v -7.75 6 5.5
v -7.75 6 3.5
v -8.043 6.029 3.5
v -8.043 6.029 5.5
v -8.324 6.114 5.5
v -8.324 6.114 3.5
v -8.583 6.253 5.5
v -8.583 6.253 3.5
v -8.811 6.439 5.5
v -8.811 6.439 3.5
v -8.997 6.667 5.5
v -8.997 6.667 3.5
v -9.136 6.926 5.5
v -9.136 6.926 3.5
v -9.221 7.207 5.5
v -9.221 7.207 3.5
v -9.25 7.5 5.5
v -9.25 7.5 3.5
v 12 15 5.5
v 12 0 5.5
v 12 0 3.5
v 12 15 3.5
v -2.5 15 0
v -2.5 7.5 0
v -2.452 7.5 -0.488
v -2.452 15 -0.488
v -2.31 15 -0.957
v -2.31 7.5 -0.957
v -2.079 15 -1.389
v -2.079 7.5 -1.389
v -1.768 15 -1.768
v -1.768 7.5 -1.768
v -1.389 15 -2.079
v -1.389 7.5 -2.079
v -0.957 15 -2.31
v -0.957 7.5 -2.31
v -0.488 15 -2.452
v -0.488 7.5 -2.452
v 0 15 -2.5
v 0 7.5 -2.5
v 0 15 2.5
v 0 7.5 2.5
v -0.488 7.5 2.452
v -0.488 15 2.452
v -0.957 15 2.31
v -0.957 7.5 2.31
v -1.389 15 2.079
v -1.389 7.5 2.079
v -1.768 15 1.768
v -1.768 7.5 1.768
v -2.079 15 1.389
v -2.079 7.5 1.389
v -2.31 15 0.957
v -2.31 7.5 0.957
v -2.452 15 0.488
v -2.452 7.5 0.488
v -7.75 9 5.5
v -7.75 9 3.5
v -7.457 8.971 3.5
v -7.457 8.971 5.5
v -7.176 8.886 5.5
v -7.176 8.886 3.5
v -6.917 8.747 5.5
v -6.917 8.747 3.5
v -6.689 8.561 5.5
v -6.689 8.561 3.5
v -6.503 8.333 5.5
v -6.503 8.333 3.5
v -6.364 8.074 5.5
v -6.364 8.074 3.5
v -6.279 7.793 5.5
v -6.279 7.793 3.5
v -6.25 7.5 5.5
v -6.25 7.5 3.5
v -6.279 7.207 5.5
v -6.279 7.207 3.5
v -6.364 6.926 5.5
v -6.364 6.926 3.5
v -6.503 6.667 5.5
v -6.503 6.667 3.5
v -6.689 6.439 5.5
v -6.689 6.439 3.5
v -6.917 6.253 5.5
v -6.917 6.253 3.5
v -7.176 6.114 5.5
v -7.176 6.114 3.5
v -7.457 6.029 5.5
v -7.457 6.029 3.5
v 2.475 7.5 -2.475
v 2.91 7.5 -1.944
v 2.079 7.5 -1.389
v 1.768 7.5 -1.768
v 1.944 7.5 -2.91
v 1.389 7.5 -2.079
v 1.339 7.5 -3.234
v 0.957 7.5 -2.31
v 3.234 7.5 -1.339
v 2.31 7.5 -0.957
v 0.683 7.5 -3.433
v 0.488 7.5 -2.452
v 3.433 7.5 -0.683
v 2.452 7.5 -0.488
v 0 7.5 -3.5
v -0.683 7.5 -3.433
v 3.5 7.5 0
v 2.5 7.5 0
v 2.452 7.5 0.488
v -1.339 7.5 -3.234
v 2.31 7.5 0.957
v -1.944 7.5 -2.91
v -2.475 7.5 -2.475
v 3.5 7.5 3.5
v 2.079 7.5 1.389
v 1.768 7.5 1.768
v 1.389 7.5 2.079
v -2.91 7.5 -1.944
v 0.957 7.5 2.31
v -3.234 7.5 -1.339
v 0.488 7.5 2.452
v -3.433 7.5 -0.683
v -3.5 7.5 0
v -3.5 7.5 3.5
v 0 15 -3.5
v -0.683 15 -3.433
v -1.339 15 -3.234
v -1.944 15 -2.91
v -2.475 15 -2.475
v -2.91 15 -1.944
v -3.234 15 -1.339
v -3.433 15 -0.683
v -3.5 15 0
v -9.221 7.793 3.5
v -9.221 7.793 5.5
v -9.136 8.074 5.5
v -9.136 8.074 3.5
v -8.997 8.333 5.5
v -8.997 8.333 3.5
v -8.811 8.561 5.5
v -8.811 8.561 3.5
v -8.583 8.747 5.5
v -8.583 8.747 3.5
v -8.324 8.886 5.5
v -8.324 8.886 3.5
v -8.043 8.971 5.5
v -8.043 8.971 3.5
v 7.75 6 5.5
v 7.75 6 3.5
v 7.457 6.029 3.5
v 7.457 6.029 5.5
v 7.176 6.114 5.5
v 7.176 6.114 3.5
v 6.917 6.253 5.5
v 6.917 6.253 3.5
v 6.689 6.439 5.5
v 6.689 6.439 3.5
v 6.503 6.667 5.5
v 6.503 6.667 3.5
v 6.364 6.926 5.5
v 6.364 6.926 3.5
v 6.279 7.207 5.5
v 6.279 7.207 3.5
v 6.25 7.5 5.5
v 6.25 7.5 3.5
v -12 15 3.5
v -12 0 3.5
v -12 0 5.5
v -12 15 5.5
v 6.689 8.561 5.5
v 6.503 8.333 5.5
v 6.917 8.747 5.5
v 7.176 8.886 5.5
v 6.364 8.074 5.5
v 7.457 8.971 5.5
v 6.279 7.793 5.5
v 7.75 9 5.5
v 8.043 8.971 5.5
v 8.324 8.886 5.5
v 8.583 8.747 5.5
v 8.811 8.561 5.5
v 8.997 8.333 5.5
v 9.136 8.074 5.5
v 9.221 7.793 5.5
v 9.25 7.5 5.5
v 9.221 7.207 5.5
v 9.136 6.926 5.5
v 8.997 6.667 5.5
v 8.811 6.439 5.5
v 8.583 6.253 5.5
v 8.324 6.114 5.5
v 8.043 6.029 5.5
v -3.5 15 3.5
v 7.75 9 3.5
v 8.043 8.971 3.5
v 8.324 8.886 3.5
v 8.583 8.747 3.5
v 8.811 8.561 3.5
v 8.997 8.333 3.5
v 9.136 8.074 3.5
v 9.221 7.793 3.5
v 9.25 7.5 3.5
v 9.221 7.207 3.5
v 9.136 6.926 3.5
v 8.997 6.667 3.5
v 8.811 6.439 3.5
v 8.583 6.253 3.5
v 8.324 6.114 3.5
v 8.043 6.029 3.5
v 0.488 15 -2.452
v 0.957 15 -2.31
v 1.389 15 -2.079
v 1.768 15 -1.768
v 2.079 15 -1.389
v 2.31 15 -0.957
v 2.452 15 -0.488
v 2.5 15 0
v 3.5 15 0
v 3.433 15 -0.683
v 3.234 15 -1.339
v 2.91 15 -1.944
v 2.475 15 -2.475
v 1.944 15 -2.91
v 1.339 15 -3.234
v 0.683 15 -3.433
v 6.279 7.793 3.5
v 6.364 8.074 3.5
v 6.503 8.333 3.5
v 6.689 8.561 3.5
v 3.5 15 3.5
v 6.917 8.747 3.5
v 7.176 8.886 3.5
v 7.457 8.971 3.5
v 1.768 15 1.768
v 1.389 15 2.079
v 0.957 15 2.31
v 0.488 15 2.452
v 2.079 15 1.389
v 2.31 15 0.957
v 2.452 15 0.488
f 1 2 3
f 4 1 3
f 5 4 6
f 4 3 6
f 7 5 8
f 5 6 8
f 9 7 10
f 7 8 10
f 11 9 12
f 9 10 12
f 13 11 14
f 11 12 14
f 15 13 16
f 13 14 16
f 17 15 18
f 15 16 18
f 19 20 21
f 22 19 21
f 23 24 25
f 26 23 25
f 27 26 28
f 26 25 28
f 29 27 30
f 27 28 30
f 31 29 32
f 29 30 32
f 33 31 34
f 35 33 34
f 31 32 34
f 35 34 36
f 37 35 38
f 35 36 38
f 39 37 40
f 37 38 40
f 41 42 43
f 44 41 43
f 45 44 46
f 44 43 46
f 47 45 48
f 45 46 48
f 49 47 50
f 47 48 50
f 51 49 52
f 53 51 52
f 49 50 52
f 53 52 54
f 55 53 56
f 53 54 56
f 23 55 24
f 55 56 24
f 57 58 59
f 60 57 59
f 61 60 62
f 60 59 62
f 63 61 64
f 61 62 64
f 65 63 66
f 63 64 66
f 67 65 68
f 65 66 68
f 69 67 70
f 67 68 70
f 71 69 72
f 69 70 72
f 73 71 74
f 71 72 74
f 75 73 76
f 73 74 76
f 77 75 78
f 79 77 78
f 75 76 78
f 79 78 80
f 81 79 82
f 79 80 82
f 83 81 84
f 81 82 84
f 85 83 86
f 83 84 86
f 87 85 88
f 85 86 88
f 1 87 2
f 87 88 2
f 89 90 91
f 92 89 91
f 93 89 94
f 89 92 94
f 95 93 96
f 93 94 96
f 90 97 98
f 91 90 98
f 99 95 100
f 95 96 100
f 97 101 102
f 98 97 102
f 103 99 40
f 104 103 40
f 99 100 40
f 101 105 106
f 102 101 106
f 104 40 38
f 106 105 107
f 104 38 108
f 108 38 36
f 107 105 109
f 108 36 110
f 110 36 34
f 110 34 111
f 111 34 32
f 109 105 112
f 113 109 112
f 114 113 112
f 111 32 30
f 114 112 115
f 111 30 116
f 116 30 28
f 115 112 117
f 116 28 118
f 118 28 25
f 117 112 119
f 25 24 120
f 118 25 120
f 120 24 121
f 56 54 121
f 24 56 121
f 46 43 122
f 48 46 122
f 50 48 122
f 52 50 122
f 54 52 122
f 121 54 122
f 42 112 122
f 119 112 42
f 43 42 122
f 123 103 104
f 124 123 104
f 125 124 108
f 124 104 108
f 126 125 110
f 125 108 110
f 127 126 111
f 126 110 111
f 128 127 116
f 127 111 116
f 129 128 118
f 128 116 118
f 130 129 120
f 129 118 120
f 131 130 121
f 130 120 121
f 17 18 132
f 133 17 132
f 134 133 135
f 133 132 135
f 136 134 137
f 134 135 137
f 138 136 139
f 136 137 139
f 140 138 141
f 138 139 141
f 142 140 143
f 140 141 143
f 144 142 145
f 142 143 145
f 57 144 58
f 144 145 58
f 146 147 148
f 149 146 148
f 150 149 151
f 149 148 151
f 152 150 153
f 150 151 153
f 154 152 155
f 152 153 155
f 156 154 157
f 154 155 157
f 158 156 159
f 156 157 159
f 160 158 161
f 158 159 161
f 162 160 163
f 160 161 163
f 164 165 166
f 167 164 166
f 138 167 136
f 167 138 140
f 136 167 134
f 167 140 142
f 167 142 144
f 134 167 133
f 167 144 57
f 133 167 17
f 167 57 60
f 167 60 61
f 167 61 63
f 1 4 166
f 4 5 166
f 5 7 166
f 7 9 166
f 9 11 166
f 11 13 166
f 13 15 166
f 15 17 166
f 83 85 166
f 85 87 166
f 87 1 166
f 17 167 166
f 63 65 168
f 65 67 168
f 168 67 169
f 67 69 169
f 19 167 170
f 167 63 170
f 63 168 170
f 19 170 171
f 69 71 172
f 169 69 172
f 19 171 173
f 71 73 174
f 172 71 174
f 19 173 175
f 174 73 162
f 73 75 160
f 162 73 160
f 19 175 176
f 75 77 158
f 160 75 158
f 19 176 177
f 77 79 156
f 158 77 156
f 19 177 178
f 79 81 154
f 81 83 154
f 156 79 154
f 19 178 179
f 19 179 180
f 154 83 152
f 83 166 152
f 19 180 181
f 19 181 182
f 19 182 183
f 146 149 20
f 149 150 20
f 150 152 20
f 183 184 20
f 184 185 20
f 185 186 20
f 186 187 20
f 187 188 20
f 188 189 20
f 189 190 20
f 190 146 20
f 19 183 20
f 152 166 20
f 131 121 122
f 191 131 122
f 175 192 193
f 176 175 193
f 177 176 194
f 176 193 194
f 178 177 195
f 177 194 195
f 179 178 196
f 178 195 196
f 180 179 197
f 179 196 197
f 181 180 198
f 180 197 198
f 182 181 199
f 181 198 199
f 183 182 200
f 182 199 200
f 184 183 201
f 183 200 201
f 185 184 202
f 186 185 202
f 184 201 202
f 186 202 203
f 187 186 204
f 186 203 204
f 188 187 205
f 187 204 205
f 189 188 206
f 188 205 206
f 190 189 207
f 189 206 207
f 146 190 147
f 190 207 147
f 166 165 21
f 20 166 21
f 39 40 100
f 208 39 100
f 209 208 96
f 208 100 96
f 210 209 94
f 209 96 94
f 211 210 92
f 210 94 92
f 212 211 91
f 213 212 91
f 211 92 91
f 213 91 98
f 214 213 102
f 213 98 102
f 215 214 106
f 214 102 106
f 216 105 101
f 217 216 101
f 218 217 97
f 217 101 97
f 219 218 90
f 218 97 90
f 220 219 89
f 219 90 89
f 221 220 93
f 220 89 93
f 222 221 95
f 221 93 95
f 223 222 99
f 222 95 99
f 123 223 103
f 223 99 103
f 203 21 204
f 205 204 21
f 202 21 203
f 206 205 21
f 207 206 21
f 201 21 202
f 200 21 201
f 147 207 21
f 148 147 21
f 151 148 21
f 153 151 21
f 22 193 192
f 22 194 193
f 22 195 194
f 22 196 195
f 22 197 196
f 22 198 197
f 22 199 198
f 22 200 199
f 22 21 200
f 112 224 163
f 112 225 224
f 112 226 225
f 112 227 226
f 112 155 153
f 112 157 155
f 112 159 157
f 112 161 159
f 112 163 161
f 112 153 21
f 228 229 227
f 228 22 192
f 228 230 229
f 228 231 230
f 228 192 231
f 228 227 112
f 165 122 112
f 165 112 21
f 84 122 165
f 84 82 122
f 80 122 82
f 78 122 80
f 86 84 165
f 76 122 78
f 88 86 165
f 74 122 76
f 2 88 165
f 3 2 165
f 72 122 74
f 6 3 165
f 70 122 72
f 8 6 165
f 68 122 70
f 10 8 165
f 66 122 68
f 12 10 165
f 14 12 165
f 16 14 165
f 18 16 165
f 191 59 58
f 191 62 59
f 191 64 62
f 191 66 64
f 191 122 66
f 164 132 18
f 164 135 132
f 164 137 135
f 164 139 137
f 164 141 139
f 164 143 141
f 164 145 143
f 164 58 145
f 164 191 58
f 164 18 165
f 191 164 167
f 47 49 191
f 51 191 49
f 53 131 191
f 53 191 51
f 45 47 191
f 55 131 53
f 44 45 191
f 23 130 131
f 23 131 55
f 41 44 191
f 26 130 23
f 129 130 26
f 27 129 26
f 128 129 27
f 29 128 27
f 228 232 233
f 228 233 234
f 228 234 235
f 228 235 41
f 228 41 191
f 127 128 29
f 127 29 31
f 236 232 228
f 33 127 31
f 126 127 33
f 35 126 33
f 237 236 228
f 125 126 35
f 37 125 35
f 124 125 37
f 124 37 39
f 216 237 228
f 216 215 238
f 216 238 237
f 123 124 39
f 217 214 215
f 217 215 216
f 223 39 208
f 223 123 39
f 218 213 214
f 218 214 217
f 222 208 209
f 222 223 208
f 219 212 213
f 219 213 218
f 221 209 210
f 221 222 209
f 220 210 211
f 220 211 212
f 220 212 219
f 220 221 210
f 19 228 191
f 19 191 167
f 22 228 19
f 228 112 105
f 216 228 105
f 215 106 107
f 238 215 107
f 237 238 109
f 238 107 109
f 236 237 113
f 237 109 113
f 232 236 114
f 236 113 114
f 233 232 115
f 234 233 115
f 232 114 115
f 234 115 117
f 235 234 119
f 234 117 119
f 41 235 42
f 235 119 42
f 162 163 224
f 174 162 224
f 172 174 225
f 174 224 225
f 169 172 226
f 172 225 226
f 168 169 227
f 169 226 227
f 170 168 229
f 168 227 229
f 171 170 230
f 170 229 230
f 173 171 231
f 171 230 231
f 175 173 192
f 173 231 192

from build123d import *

# Parameters (mm, degrees)
BOSS_EXTRUDE1_DEPTH = 15
CUT_EXTRUDE1_DEPTH  = 21.4450483
SKETCH3_W           = 7
SKETCH3_H           = 7.5
CUT_EXTRUDE2_DEPTH  = 21.4450483


with BuildPart() as part:
    # Sketch1 → Boss-Extrude1 (new body)
    with BuildSketch(Plane(origin=(0, 0, 0), x_dir=(1, 0, 0), z_dir=(0, 1, 0))):
        with BuildLine():
            ThreePointArc((0, 2.5), (1.767766953, 1.767766953), (2.5, 0))
            Line((2.5, 0), (3.5, 0))
            ThreePointArc((3.5, 0), (2.474873734, 2.474873734), (0, 3.5))
            Line((0, 3.5), (0, 2.5))
        make_face()
        with BuildLine():
            Line((-3.5, 0), (-2.5, 0))
            ThreePointArc((-2.5, 0), (-1.767766953, 1.767766953), (0, 2.5))
            Line((0, 2.5), (0, 3.5))
            ThreePointArc((0, 3.5), (-2.474873734, 2.474873734), (-3.5, 0))
        make_face()
        with BuildLine():
            Line((0, -5.5), (0, -2.5))
            ThreePointArc((0, -2.5), (-1.767766953, -1.767766953), (-2.5, 0))
            Line((-2.5, 0), (-3.5, 0))
            Line((-3.5, 0), (-3.5, -3.5))
            Line((-3.5, -3.5), (-12, -3.5))
            Line((-12, -3.5), (-12, -5.5))
            Line((-12, -5.5), (0, -5.5))
        make_face()
        with BuildLine():
            ThreePointArc((2.5, 0), (1.767766953, -1.767766953), (0, -2.5))
            Line((0, -2.5), (0, -5.5))
            Line((0, -5.5), (12, -5.5))
            Line((12, -5.5), (12, -3.5))
            Line((12, -3.5), (3.5, -3.5))
            Line((3.5, -3.5), (3.5, 0))
            Line((3.5, 0), (2.5, 0))
        make_face()
    extrude(amount=BOSS_EXTRUDE1_DEPTH)

    # Sketch2 → Cut-Extrude1 (cut, through all)
    with BuildSketch(Plane(origin=(0, 0, 3.5), x_dir=(-1, 0, 0), z_dir=(0, 0, -1))):
        with BuildLine():
            ThreePointArc((-6.25, 7.5), (-6.689339828, 8.560660172), (-7.75, 9))
            Line((-7.75, 9), (-7.75, 6))
            ThreePointArc((-7.75, 6), (-6.689339828, 6.439339828), (-6.25, 7.5))
        make_face()
        with BuildLine():
            Line((-7.75, 6), (-7.75, 9))
            ThreePointArc((-7.75, 9), (-9.25, 7.5), (-7.75, 6))
        make_face()
        with BuildLine():
            ThreePointArc((9.25, 7.5), (8.810660172, 8.560660172), (7.75, 9))
            Line((7.75, 9), (7.75, 6))
            ThreePointArc((7.75, 6), (8.810660172, 6.439339828), (9.25, 7.5))
        make_face()
        with BuildLine():
            Line((7.75, 6), (7.75, 9))
            ThreePointArc((7.75, 9), (6.25, 7.5), (7.75, 6))
        make_face()
    extrude(amount=-CUT_EXTRUDE1_DEPTH, mode=Mode.SUBTRACT)

    # Sketch3 → Cut-Extrude2 (cut, through all)
    with BuildSketch(Plane(origin=(0, 0, 3.5), x_dir=(-1, 0, 0), z_dir=(0, 0, -1))):
        with Locations((0, 3.75)):
            Rectangle(SKETCH3_W, SKETCH3_H)
    extrude(amount=CUT_EXTRUDE2_DEPTH, mode=Mode.SUBTRACT)


solid = part.part
